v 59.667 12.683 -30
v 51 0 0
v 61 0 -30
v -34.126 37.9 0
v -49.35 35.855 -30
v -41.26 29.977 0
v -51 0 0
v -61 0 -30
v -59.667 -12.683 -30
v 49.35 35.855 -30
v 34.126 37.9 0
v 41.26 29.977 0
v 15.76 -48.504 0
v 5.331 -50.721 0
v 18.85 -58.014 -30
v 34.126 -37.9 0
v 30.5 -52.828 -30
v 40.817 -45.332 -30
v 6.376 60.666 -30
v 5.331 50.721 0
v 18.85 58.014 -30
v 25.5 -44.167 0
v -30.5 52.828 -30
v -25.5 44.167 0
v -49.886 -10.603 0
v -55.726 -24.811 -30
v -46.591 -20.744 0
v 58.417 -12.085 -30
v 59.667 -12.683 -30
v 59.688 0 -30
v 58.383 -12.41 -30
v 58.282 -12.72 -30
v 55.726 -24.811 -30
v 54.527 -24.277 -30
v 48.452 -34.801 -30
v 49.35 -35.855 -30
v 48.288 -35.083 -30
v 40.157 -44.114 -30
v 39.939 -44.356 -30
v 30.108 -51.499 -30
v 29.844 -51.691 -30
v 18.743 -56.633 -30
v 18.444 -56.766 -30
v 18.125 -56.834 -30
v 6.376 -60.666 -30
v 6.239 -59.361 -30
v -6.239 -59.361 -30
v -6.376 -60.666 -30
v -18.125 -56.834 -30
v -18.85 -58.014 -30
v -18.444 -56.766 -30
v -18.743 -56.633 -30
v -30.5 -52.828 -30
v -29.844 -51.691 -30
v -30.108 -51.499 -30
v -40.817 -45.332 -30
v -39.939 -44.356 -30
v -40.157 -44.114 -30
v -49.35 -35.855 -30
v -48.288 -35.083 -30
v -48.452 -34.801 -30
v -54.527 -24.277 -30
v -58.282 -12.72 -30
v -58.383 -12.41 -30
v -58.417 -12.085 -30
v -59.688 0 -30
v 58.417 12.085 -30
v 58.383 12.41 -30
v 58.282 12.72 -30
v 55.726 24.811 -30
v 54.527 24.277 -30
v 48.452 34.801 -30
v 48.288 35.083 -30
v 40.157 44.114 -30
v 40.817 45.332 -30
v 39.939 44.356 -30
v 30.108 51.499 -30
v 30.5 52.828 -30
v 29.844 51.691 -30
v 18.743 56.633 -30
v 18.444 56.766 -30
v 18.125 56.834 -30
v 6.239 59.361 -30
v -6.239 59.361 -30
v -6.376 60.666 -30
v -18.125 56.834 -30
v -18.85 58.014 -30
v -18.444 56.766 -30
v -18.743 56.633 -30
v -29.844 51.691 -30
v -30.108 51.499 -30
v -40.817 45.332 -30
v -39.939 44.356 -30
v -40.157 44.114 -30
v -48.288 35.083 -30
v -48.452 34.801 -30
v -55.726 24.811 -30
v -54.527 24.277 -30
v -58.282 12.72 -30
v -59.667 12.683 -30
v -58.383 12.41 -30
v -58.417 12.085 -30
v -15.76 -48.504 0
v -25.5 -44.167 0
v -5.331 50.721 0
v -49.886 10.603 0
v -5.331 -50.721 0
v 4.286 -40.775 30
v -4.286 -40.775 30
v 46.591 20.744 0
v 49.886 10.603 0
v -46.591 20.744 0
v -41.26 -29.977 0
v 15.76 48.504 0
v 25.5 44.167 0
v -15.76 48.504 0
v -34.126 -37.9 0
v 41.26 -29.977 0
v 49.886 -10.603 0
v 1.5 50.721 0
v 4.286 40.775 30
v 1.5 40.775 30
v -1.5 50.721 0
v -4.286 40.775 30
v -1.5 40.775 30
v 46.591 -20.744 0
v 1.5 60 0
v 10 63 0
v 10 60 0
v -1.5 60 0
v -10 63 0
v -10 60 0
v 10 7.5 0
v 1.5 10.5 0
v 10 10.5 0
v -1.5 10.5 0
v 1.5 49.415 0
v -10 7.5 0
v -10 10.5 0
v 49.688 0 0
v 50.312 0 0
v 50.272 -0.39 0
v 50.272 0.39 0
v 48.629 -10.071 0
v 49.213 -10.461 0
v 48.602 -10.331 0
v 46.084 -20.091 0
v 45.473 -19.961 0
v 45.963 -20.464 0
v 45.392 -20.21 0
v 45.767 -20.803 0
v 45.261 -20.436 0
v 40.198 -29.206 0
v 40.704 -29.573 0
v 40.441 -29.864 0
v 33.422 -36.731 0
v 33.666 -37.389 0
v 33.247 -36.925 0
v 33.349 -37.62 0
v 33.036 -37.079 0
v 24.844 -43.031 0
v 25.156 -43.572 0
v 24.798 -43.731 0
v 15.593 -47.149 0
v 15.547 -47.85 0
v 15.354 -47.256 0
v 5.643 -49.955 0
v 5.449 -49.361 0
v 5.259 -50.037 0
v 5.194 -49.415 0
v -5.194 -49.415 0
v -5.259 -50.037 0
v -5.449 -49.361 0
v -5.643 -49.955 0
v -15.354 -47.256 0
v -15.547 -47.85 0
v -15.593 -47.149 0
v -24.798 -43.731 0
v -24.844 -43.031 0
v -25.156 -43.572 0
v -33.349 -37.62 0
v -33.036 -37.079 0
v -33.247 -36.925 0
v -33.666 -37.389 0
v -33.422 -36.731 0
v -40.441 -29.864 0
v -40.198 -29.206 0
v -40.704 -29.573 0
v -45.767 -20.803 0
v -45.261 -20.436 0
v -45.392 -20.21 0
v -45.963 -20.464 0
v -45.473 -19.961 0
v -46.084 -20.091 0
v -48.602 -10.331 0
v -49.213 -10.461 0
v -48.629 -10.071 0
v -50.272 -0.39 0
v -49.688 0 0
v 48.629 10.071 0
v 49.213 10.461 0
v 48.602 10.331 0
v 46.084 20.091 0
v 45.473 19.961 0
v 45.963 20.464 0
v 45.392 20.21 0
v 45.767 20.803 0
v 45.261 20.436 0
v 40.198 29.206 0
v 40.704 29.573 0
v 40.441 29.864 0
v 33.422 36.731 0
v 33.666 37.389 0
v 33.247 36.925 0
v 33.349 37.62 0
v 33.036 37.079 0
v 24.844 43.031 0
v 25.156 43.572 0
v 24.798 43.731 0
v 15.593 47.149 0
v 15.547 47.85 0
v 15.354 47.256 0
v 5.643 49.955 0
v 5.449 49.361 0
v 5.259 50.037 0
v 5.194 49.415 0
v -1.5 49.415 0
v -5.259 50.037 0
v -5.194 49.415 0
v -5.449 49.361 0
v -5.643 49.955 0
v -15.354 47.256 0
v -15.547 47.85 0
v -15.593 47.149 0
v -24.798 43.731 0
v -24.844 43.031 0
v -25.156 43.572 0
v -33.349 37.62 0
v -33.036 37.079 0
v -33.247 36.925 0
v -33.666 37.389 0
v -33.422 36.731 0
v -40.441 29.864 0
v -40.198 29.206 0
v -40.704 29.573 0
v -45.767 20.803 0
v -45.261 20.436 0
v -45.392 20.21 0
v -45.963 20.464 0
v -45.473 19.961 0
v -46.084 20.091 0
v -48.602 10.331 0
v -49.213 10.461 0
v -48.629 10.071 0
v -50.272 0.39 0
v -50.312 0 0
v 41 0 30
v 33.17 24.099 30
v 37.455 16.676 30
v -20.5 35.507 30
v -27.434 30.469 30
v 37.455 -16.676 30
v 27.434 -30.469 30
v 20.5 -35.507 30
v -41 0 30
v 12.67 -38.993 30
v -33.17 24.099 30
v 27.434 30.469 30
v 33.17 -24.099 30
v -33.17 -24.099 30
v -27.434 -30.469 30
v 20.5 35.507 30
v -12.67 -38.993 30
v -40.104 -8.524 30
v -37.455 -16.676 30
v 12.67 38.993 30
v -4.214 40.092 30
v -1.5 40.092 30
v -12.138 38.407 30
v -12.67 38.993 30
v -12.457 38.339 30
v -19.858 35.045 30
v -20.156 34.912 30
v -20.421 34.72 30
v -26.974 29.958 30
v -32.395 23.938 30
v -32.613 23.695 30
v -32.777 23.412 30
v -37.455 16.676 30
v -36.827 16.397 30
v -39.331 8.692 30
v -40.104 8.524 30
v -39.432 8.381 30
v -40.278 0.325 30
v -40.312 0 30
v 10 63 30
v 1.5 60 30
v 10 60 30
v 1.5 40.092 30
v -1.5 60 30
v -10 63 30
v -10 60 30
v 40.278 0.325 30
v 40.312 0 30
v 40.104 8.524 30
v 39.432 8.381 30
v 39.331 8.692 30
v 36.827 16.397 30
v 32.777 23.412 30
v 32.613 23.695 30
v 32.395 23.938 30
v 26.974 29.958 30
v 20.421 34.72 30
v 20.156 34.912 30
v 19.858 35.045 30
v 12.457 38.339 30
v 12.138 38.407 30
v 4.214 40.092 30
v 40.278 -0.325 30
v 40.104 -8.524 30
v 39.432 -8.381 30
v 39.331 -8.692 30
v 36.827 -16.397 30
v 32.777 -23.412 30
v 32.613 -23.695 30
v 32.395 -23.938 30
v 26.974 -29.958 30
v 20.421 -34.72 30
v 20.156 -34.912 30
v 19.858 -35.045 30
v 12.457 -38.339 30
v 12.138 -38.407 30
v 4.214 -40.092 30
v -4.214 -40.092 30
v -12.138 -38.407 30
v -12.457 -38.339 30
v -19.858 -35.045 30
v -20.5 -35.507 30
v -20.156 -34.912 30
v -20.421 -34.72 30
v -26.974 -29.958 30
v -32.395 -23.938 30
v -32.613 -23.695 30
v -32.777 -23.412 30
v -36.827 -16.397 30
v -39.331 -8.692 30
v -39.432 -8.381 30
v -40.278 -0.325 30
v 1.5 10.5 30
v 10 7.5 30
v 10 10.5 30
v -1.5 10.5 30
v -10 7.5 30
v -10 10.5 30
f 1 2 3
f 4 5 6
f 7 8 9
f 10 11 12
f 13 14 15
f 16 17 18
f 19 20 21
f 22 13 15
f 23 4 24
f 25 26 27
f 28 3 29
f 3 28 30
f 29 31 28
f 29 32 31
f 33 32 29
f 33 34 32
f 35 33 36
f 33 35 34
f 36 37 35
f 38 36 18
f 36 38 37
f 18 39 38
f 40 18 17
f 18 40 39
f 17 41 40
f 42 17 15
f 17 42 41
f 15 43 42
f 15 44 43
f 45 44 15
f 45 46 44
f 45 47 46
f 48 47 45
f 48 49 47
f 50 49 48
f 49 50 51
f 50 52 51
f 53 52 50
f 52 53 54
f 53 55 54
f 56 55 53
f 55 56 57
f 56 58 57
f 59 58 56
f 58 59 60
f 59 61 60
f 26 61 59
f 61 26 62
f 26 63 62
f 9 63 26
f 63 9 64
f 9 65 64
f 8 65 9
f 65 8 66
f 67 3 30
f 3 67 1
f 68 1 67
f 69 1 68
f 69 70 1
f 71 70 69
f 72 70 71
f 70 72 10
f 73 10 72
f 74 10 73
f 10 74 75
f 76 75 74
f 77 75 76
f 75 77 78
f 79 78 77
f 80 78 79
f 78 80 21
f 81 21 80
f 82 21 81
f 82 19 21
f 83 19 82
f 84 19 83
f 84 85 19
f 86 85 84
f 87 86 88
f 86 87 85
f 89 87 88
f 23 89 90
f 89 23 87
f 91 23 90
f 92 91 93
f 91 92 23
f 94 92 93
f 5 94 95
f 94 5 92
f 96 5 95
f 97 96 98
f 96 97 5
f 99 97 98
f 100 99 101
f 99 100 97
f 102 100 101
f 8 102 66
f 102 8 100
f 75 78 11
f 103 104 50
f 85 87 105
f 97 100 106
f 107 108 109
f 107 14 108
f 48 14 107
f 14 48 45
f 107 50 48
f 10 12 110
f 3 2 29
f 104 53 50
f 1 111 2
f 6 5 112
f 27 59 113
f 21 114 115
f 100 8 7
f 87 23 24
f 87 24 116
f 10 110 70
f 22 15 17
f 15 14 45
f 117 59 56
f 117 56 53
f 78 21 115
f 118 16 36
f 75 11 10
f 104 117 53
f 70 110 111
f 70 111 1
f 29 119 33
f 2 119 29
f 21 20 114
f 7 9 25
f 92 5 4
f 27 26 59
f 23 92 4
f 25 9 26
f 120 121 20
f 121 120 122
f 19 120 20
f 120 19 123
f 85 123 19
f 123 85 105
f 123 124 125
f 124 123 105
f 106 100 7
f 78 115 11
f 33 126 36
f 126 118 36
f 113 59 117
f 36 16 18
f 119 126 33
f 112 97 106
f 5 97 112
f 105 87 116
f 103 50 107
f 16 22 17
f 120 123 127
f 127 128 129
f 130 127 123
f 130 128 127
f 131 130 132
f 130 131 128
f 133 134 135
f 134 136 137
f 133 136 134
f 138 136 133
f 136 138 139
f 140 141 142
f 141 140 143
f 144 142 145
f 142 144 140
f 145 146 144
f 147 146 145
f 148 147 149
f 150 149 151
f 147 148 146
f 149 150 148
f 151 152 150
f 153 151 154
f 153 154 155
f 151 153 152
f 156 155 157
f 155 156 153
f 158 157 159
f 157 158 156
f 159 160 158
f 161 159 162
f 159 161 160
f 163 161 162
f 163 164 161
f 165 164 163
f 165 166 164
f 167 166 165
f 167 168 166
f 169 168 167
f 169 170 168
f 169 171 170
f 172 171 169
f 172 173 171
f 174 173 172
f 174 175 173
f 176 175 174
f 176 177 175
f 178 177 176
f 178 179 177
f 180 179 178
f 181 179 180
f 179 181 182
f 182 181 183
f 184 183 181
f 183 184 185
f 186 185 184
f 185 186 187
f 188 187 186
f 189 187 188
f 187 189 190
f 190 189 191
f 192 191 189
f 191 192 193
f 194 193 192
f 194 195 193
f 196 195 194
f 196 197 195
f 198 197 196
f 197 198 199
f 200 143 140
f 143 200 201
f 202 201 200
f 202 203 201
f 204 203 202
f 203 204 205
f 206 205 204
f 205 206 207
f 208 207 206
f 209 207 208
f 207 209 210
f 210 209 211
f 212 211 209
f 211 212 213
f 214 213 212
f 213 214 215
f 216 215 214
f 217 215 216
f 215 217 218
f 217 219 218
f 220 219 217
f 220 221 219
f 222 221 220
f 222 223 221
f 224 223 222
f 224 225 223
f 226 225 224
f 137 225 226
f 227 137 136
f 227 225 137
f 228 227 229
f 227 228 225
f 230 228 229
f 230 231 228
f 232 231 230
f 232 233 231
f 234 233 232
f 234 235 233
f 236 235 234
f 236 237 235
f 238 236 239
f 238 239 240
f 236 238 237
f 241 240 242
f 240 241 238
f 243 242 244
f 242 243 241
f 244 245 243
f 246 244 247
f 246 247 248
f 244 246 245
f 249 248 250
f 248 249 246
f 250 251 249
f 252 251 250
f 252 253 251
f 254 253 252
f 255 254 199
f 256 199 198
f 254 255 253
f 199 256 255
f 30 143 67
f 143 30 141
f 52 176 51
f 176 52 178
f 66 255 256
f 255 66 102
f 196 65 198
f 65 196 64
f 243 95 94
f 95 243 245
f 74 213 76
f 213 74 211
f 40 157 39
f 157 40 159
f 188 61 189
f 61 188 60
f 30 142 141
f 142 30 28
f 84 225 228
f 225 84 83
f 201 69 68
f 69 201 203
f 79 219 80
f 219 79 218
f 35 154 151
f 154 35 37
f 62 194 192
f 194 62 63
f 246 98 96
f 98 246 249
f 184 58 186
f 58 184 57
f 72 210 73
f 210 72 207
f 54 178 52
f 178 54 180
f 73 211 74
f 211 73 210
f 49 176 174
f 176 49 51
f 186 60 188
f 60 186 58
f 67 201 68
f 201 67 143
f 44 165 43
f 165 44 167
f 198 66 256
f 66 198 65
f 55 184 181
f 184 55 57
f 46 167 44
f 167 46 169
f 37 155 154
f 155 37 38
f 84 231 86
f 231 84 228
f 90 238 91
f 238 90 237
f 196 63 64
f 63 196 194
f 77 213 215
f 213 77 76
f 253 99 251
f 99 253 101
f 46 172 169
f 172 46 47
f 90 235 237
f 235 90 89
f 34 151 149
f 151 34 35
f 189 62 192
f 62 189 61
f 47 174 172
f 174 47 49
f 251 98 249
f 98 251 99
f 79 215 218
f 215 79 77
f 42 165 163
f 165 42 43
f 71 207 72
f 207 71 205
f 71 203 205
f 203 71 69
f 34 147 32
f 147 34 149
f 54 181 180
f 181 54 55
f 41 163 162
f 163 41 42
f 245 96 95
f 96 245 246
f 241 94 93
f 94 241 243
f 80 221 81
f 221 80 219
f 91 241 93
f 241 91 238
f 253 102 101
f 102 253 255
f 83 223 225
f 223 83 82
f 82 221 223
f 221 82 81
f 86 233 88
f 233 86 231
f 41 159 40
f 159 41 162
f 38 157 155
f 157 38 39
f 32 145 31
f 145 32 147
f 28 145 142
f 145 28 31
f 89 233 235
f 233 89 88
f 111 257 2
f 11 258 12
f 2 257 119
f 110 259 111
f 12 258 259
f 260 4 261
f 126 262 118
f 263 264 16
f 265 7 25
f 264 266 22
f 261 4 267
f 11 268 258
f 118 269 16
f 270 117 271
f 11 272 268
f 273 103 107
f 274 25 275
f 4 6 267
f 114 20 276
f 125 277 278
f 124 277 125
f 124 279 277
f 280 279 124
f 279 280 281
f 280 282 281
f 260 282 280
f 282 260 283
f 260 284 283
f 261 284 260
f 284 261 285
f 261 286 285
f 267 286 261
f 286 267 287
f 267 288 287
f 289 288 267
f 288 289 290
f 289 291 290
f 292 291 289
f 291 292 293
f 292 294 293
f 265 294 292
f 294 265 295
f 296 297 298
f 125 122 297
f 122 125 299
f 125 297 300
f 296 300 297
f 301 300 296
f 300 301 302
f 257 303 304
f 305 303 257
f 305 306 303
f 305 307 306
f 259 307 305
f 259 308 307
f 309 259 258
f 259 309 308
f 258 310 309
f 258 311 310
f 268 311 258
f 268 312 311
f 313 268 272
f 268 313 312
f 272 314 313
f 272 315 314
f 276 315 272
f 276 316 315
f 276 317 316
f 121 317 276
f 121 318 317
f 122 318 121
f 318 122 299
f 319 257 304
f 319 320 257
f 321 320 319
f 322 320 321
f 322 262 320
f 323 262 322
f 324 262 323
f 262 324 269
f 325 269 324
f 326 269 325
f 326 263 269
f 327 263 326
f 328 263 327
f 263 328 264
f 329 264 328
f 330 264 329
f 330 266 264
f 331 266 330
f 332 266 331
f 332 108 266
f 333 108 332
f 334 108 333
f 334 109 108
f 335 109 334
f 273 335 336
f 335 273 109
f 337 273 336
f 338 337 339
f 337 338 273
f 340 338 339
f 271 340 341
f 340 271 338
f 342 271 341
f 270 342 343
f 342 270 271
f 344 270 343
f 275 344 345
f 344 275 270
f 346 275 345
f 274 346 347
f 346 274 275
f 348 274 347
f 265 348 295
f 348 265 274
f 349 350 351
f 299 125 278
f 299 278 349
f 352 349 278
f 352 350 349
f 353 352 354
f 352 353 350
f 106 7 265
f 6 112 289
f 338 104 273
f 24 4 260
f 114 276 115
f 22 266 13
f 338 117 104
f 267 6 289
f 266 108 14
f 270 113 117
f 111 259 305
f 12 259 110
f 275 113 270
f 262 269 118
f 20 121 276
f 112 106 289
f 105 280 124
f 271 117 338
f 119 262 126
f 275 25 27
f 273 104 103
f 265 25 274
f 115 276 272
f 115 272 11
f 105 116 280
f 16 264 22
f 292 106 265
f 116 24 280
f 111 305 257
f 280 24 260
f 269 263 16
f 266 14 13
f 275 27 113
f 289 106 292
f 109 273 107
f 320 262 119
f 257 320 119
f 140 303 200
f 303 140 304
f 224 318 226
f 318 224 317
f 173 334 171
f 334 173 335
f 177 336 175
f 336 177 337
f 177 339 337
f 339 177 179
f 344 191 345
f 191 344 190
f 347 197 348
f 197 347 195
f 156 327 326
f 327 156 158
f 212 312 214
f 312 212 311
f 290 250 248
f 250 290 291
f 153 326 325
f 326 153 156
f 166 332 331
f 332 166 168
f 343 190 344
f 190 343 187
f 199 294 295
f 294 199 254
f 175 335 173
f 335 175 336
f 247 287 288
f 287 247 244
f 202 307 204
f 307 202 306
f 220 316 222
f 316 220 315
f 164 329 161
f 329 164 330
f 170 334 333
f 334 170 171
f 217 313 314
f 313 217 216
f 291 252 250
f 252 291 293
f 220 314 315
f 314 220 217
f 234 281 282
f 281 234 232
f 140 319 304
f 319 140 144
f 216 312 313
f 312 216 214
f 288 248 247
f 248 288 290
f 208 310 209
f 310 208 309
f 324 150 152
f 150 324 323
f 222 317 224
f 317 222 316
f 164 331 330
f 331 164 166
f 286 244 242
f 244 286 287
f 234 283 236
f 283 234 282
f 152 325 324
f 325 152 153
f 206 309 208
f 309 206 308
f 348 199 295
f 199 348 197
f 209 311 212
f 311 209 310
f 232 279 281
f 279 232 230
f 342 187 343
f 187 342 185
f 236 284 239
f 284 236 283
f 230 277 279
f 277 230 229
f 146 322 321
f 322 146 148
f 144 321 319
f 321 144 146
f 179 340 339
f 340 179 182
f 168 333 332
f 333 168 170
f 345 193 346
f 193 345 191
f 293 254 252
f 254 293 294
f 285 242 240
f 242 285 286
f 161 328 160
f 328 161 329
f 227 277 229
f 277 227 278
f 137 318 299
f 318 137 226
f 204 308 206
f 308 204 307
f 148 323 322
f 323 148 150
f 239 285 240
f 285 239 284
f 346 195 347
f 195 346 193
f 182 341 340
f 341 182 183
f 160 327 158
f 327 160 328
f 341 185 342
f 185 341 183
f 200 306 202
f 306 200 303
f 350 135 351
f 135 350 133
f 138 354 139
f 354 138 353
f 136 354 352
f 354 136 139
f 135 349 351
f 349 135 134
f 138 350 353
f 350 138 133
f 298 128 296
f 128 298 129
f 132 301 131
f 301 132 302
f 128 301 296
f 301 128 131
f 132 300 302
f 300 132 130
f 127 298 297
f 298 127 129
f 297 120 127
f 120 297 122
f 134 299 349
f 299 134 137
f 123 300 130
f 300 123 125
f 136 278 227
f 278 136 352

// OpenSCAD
r_front = 60;
r_middle = 50;
r_back = 40;
h_front = 30;
h_back = 30;
thinckness = 1;

plate_thinckness = 3;
motor_width = 20;
motor_height = 15;

//front
translate([0,0,-h_front/2]) {
    difference() {
     cylinder(h = h_front, r1 = r_front+thinckness, r2 = r_middle+thinckness, center = true);
        cylinder(h = h_front+2, r1 = r_front, r2 = r_middle, center = true);
    }
}

//back
translate([0,0,h_back/2]) {
    difference() {
        cylinder(h = h_back, r1 = r_middle+thinckness, r2 = r_back+thinckness, center = true);
        cylinder(h = h_back+2, r1 = r_middle, r2 = r_back, center = true);
    }
}

translate([0,plate_thinckness/2+motor_height/2,h_back/2]) {
    cube([motor_width,plate_thinckness,h_back],center=true);
}

translate([0,plate_thinckness/2+r_front,h_back/2]) {
    cube([motor_width,plate_thinckness,h_back],center=true);
}

translate([0,r_front-(r_front-motor_height/2-plate_thinckness/2)/2,h_back/2]) {
    cube([plate_thinckness,r_front-motor_height/2-plate_thinckness/2,h_back],center=true);
}


